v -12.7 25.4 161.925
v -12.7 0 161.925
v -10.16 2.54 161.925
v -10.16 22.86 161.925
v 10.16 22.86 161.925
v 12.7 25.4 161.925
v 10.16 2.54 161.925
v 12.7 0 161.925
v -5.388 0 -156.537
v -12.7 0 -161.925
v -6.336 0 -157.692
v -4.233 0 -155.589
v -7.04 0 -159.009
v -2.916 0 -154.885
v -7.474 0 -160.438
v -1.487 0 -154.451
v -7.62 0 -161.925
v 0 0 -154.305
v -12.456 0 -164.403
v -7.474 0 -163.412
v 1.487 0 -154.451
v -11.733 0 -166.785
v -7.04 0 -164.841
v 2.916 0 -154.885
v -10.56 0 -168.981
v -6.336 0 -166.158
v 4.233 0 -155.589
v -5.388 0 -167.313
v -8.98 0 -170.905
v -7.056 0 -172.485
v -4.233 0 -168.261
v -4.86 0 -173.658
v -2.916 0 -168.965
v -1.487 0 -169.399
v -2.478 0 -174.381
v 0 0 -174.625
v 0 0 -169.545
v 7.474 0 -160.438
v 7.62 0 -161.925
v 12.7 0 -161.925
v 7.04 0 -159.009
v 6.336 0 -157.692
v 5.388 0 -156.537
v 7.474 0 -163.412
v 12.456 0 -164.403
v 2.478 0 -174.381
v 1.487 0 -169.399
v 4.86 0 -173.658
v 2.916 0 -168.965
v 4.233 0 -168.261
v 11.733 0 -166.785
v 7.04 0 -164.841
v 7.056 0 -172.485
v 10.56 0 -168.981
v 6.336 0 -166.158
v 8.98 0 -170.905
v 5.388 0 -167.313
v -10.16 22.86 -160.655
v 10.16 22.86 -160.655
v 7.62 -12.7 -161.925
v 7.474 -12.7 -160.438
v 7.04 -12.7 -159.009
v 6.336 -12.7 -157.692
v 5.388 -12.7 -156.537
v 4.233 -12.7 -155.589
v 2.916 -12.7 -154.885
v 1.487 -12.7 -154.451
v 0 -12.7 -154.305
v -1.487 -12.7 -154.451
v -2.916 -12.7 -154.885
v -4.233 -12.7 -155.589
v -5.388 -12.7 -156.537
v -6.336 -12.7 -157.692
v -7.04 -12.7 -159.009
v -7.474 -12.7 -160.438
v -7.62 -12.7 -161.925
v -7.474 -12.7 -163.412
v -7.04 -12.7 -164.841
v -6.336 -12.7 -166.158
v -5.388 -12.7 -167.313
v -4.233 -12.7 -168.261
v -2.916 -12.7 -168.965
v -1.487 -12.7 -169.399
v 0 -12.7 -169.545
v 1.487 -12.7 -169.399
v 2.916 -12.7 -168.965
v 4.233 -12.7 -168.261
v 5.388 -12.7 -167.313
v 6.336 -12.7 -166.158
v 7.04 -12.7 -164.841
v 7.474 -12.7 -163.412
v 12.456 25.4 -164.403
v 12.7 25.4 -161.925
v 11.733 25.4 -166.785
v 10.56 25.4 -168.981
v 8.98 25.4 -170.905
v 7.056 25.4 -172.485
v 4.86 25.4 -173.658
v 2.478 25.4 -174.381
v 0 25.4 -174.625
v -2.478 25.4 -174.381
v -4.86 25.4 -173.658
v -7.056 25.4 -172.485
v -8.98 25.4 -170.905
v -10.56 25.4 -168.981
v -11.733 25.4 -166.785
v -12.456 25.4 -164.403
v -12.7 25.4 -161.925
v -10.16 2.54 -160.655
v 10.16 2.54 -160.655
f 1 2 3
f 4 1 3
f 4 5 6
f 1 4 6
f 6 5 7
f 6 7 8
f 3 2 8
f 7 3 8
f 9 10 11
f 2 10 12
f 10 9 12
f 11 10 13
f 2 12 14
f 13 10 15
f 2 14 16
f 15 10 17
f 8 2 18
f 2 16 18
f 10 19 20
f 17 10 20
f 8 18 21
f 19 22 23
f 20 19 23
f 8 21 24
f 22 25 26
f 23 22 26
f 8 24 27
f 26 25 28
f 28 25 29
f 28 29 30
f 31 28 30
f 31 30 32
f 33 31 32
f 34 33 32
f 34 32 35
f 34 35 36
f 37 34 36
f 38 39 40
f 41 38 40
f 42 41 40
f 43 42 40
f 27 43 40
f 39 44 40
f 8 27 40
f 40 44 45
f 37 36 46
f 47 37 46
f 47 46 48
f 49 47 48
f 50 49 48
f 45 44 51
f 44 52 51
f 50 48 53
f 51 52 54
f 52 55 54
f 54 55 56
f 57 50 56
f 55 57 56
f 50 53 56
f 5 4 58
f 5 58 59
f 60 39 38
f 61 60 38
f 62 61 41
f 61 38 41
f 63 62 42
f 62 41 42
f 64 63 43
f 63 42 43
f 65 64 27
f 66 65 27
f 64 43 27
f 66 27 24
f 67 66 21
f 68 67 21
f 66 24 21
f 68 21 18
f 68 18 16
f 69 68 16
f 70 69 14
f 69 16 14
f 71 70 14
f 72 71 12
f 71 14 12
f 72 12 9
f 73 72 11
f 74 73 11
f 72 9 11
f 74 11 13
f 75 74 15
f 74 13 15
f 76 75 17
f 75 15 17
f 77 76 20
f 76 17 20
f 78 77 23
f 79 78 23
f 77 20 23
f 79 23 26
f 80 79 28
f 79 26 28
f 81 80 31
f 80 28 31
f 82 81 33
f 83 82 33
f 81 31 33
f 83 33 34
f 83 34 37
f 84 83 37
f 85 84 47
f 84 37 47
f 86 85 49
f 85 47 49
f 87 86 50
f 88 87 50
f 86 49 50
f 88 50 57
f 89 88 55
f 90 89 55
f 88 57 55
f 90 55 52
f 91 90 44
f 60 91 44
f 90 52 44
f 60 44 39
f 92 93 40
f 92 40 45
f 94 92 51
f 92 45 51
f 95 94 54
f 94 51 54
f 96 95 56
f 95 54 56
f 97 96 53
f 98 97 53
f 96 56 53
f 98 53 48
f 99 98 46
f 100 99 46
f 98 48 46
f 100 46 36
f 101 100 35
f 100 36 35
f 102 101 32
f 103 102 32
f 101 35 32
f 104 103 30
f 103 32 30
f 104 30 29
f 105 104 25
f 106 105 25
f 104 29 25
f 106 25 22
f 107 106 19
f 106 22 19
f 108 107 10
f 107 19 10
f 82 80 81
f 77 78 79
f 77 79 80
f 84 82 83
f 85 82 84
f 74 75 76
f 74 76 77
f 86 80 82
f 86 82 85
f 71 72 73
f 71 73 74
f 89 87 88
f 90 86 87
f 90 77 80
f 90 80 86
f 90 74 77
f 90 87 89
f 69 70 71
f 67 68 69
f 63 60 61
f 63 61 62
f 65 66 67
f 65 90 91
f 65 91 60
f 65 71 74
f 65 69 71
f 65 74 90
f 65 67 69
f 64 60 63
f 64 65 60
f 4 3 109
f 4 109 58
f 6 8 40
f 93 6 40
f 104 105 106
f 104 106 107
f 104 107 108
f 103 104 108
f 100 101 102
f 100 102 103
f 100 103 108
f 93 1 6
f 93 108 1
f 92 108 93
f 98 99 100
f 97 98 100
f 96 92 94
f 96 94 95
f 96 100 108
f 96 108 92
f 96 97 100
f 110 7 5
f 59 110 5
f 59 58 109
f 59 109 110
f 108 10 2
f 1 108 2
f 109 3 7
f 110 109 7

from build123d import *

# Parameters (mm, degrees)
BOSS_EXTRUDE1_DEPTH = 25.4
SKETCH2_W           = 20.32
SKETCH2_H           = 20.32
CUT_EXTRUDE1_DEPTH  = 322.58
SKETCH3_R           = 7.62
BOSS_EXTRUDE2_DEPTH = 12.7


with BuildPart() as part:
    # Sketch1 → Boss-Extrude1 (new body)
    with BuildSketch(Plane(origin=(0, 0, 0), x_dir=(1, 0, 0), z_dir=(0, 1, 0))):
        with BuildLine():
            Line((-12.7, -161.925), (12.7, -161.925))
            Line((12.7, -161.925), (12.7, 161.925))
            ThreePointArc((12.7, 161.925), (0, 174.625), (-12.7, 161.925))
            Line((-12.7, 161.925), (-12.7, -161.925))
        make_face()
    extrude(amount=BOSS_EXTRUDE1_DEPTH)

    # Sketch2 → Cut-Extrude1 (cut)
    with BuildSketch(Plane.XY.offset(161.925)):
        with Locations((0, 12.7)):
            Rectangle(SKETCH2_W, SKETCH2_H)
    extrude(amount=-CUT_EXTRUDE1_DEPTH, mode=Mode.SUBTRACT)

    # Sketch3 → Boss-Extrude2 (add)
    with BuildSketch(Plane.XZ):
        with Locations((0, -161.925)):
            Circle(SKETCH3_R)
    extrude(amount=BOSS_EXTRUDE2_DEPTH)


solid = part.part
